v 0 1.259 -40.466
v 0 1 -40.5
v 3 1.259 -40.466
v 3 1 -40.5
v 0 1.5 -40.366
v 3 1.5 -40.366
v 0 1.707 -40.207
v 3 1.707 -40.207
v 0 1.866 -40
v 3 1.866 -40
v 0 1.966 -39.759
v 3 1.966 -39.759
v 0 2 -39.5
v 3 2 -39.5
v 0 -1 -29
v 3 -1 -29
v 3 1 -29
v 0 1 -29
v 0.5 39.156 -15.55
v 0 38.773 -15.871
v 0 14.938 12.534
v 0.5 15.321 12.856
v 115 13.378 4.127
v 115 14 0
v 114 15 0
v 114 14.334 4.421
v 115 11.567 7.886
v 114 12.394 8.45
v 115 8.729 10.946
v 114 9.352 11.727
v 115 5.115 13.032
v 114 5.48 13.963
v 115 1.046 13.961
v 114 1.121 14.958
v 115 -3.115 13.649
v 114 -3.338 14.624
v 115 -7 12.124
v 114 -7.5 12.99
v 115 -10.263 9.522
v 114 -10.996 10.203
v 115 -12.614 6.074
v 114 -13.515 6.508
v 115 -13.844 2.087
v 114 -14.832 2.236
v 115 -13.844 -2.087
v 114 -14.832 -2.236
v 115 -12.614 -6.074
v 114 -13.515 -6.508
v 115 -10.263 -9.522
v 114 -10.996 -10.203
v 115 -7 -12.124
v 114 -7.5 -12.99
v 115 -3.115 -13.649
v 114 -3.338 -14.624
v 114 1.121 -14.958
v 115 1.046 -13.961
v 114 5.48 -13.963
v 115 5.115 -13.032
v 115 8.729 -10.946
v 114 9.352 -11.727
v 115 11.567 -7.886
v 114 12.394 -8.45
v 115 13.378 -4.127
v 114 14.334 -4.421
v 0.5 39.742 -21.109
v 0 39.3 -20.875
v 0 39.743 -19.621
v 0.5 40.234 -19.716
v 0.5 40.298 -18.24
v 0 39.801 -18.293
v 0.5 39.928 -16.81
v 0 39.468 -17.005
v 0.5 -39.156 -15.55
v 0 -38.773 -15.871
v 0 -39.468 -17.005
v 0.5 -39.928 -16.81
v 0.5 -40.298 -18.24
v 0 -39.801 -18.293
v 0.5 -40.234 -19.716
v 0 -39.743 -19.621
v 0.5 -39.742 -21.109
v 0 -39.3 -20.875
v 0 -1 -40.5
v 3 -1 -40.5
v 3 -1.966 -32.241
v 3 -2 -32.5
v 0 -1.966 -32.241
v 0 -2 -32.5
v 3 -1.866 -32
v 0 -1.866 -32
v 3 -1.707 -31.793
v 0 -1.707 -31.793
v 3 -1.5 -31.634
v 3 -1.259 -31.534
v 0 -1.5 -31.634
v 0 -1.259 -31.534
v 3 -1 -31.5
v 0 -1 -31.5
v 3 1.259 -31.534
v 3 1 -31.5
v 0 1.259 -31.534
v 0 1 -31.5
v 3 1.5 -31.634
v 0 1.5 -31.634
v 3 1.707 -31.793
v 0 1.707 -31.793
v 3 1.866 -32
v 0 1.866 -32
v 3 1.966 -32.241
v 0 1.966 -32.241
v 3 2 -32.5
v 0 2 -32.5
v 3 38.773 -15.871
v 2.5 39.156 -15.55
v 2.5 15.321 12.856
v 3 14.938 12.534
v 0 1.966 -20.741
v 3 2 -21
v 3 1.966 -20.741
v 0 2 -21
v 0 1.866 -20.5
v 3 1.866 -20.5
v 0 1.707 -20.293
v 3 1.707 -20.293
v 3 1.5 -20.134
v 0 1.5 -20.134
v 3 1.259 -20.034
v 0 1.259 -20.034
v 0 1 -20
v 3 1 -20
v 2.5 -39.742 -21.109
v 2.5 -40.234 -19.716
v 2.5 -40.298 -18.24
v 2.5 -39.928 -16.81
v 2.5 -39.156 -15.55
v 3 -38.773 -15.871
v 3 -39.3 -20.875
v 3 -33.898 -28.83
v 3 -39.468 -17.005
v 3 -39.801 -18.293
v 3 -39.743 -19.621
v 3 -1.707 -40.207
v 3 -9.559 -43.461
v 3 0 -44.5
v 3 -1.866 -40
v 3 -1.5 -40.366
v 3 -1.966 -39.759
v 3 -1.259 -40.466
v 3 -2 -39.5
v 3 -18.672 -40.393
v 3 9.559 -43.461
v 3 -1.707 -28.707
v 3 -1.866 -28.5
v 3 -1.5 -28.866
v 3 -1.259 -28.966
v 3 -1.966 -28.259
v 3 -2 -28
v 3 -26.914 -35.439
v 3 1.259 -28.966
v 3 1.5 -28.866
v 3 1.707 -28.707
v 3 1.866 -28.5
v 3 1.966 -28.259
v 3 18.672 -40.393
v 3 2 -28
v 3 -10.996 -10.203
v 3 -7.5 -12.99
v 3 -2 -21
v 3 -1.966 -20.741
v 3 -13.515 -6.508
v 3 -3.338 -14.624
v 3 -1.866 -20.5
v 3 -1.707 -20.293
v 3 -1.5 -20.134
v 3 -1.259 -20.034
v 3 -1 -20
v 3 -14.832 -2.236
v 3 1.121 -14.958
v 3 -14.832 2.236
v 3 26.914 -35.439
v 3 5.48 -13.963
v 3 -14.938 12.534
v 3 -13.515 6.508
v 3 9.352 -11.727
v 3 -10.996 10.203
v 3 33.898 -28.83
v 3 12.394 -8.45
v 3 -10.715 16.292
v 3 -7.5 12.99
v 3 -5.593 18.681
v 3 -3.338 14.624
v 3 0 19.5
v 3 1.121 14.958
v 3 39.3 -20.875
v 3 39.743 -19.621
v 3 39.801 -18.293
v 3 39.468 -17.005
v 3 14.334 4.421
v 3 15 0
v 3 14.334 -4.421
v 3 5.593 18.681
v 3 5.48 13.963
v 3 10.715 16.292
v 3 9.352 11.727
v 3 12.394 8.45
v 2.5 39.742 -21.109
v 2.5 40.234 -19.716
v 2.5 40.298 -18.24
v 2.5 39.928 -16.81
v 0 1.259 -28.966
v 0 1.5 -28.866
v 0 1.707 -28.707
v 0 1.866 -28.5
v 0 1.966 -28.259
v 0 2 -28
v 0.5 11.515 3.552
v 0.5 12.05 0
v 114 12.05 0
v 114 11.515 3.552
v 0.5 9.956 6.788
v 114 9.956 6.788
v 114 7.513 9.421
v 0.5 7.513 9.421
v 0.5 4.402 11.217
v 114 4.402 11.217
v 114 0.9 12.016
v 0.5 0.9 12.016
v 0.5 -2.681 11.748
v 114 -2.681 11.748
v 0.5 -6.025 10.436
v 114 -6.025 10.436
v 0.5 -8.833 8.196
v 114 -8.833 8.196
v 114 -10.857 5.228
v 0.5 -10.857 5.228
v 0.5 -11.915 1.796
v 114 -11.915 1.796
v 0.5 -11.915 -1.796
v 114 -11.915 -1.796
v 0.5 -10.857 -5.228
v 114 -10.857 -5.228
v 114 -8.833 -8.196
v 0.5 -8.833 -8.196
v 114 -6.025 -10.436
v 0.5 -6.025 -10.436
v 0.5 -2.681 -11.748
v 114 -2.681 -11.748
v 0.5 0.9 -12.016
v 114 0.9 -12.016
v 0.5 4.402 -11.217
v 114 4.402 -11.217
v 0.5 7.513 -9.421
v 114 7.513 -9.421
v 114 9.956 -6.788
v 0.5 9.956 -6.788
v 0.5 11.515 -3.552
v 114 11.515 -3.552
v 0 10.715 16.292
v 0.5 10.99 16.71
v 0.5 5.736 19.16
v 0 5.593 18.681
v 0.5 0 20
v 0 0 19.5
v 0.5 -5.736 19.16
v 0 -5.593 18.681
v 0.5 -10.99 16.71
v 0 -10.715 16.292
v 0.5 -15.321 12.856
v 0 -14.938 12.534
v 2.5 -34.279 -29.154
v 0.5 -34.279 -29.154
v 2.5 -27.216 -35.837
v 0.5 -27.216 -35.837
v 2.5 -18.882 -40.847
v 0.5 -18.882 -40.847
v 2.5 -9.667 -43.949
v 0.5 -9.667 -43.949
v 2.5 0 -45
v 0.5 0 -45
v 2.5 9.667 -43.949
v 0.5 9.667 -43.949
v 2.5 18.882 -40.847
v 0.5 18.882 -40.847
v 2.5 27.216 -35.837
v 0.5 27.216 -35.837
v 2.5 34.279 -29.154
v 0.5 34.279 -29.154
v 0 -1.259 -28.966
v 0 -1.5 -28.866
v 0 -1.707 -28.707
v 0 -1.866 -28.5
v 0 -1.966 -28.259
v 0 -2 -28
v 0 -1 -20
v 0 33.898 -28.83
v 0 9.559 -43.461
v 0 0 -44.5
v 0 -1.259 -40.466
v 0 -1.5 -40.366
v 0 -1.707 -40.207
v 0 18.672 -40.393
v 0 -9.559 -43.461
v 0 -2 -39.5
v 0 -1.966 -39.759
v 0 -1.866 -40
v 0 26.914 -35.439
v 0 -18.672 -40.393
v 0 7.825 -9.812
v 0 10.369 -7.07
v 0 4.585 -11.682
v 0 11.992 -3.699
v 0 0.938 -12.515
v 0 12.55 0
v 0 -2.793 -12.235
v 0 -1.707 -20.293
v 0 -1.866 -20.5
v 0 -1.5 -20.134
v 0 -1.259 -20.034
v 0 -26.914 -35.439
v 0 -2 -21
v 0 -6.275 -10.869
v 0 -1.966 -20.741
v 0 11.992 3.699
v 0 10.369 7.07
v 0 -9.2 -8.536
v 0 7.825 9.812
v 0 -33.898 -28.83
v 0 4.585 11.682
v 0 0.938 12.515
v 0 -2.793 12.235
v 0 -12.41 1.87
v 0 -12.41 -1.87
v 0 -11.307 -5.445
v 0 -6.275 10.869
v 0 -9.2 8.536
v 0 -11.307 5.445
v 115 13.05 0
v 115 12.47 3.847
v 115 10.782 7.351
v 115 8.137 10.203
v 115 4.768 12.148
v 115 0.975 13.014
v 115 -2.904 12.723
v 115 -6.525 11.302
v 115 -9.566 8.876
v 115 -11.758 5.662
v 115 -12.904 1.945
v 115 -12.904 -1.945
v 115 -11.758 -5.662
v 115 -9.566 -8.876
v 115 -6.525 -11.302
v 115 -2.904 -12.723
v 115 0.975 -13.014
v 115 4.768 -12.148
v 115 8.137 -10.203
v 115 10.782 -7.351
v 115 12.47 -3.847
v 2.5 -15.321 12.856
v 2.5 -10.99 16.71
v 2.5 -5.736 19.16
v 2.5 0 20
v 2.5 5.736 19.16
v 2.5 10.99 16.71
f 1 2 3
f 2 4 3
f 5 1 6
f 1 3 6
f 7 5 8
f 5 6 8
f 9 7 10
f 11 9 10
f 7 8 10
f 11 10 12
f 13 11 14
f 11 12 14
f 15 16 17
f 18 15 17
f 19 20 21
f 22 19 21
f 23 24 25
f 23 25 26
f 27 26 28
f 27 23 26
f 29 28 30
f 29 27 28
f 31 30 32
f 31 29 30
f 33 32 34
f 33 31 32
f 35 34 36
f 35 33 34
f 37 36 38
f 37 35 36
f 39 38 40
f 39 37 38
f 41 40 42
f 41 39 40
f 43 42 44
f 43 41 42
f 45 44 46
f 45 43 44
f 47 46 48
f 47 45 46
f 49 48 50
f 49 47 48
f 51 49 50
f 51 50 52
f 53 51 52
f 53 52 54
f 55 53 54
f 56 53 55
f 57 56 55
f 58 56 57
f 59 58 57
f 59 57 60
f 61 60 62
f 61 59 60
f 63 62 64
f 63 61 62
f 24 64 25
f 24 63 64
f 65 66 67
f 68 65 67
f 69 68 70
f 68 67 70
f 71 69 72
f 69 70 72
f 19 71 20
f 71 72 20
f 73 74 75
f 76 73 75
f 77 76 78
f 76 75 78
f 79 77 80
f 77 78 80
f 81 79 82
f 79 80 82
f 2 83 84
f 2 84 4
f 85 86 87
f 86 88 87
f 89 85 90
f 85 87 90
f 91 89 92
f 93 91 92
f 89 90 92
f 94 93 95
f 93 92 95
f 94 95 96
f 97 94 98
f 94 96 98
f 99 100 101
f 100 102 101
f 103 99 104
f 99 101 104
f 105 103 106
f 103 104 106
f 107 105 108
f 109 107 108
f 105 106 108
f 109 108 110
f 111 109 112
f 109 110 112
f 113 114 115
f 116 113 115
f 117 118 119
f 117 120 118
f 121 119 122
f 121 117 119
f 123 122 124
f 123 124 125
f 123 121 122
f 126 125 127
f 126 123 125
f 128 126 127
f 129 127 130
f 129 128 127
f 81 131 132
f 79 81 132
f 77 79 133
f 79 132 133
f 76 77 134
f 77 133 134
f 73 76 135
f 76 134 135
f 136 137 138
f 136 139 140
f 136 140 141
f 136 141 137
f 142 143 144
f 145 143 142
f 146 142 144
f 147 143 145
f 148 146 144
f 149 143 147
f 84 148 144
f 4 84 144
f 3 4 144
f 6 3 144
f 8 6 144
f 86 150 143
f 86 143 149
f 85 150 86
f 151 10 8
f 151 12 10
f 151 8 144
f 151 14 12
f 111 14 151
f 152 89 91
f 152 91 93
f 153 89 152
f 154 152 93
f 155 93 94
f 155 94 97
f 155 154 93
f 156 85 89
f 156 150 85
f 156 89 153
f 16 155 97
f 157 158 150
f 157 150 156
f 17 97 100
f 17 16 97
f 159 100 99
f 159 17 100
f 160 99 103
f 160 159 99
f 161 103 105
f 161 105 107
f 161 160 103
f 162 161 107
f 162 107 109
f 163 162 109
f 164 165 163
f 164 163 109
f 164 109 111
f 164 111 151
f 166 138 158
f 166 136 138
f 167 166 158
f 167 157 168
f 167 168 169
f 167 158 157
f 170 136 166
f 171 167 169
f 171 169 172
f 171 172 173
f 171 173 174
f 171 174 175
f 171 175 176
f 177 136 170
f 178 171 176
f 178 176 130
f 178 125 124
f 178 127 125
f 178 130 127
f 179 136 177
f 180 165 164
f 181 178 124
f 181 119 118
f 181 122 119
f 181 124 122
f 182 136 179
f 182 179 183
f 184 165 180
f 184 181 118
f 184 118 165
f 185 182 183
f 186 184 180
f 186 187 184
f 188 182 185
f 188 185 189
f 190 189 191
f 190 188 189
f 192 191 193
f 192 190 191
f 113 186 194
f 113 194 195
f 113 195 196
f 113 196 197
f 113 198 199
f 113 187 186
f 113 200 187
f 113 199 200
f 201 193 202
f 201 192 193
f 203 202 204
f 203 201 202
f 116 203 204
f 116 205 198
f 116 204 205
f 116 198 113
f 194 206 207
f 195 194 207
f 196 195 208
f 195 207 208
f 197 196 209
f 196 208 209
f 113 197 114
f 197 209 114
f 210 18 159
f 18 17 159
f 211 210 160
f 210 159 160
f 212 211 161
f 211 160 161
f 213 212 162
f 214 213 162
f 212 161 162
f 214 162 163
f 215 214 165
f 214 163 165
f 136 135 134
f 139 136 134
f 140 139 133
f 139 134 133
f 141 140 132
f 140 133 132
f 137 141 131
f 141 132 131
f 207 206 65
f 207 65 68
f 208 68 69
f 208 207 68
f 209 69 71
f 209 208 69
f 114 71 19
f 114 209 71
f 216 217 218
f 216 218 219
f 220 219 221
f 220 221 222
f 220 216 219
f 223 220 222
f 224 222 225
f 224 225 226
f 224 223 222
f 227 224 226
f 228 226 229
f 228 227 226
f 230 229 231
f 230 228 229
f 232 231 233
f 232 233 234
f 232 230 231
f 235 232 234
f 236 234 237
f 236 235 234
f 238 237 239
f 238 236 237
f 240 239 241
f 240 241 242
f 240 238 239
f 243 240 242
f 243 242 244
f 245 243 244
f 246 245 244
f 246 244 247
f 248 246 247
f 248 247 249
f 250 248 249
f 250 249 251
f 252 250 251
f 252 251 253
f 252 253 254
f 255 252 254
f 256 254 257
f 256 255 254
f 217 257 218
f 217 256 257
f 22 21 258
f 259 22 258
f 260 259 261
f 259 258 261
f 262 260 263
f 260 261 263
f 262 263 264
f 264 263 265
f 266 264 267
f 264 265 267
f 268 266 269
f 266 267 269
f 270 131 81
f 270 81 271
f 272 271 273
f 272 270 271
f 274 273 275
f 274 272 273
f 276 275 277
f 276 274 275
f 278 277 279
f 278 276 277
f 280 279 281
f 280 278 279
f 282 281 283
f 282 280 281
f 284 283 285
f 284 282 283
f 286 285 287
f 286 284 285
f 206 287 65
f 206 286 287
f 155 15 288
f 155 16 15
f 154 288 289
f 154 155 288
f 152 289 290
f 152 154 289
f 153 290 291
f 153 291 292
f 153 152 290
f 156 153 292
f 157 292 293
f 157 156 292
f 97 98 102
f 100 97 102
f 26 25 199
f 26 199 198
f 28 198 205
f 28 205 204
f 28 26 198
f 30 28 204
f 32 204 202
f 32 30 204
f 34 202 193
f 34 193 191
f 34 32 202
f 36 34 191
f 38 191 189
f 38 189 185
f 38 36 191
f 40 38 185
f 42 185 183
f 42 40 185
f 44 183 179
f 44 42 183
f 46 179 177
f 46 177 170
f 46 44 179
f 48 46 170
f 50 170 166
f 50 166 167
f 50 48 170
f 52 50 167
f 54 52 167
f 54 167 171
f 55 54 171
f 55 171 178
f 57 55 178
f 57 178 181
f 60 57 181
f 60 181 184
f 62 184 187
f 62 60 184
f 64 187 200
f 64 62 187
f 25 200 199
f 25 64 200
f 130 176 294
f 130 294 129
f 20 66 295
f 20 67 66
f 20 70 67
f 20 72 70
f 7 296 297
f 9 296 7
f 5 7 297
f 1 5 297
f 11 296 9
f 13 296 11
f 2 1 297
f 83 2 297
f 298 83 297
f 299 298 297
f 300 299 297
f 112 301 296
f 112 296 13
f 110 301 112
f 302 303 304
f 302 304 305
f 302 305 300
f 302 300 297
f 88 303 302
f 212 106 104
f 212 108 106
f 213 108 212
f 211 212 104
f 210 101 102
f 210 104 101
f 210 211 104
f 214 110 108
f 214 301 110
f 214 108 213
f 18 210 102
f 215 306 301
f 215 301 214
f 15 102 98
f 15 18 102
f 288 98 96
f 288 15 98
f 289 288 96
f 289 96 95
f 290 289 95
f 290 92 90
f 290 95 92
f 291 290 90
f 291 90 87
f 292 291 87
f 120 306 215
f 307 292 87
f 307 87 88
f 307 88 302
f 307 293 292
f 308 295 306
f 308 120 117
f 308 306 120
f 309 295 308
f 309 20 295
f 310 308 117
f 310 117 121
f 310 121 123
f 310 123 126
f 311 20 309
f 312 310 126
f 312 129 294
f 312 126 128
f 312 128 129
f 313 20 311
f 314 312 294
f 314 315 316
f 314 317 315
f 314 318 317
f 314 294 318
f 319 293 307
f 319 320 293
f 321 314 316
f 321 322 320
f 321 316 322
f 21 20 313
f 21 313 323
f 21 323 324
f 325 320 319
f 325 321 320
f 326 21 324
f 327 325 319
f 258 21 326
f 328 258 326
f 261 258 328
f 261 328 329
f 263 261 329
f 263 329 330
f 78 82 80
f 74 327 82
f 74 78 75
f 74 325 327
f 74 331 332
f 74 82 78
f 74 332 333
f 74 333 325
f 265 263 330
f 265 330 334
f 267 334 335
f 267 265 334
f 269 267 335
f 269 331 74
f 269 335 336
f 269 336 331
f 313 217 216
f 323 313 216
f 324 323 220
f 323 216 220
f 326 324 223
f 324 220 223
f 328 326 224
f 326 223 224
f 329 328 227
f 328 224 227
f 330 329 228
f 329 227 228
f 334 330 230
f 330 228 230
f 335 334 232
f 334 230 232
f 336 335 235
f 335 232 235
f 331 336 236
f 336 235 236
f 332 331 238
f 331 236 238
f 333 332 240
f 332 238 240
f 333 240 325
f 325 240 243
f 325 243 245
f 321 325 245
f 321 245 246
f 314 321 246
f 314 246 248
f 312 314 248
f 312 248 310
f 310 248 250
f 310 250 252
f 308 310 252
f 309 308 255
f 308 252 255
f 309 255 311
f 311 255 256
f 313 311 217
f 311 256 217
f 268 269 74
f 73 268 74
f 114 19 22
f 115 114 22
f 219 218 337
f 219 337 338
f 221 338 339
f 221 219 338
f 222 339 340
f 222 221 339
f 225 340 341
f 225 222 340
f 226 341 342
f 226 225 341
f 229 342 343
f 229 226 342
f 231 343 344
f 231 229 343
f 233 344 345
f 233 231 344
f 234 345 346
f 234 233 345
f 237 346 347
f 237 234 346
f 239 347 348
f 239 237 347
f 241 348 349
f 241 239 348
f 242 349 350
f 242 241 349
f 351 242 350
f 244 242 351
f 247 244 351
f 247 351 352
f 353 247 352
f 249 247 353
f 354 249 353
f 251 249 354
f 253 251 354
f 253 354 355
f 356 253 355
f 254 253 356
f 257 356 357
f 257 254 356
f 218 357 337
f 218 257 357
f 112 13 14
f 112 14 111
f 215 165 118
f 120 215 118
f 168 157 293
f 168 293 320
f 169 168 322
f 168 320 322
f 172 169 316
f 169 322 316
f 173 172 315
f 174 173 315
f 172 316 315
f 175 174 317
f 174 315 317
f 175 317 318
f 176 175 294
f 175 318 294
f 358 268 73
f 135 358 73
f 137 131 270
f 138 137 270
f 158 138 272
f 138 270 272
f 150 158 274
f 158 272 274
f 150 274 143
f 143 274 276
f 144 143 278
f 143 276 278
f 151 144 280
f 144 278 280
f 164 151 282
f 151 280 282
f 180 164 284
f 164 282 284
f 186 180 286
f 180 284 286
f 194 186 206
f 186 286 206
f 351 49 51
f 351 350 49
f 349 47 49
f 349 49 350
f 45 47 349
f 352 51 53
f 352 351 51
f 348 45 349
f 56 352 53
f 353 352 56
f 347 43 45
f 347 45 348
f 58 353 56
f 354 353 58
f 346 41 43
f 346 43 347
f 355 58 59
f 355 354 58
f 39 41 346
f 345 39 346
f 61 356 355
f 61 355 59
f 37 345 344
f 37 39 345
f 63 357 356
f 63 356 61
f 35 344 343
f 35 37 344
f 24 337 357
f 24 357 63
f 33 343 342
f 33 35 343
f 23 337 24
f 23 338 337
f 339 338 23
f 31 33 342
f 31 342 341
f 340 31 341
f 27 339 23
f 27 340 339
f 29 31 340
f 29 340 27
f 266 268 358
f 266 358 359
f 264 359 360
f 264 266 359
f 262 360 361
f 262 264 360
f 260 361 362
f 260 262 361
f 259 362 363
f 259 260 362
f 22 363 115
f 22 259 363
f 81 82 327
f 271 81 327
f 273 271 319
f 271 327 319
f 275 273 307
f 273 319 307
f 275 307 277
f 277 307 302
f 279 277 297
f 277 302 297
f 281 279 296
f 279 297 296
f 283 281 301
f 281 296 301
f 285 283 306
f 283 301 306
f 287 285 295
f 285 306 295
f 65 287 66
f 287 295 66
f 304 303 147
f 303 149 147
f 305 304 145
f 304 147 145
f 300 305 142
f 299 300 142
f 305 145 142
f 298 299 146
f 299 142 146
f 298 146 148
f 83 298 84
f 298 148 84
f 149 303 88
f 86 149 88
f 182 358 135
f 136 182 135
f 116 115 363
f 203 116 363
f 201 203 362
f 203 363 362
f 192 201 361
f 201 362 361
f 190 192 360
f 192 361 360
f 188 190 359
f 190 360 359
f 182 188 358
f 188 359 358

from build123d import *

# Parameters (mm, degrees)
SKETCH001_W     = 4
SKETCH001_H     = 9
POCKET_DEPTH    = 3
POCKET001_DEPTH = 5
FILLET_R        = 5
FILLET001_R     = 1
CHAMFER_SIZE    = 0.5
CHAMFER001_SIZE = 1


with BuildPart() as part:
    # Sketch → Revolution (revolve)
    with BuildSketch(Plane.XY):
        Polygon((0, 45), (3, 45), (3, 15), (115, 15), (115, 12.05), (0, 12.05), align=None)
    revolve(axis=Axis((0, 0, 0), (1, 0, 0)))

    # Sketch001 → Pocket (cut, symmetric)
    with BuildSketch(Plane.YZ.offset(2)):
        with Locations((0, -36)):
            Rectangle(SKETCH001_W, SKETCH001_H)
        with Locations((0, -24.5)):
            Rectangle(SKETCH001_W, SKETCH001_H)
    extrude(amount=POCKET_DEPTH, both=True, mode=Mode.SUBTRACT)

    # Sketch002 → Pocket001 (cut)
    with BuildSketch(Plane(origin=(0, 0, 0), x_dir=(0, -1, 0), z_dir=(-1, 0, 0))):
        with BuildLine():
            ThreePointArc((44.777118, -22.248814), (0, 50), (-44.777118, -22.248814))
            Line((-44.777118, -22.248814), (-15.320889, 12.855752))
            ThreePointArc((15.320889, 12.855752), (0, 20), (-15.320889, 12.855752))
            Line((15.320889, 12.855752), (44.777118, -22.248814))
        make_face()
    extrude(amount=-POCKET001_DEPTH, mode=Mode.SUBTRACT)

    # Fillet
    fillet_edges = [part.edges().sort_by_distance(p)[0] for p in [
        (1.5, 41.232486, -18.024487),
        (1.5, -41.232486, -18.024487),
    ]]
    fillet(fillet_edges, radius=FILLET_R)

    # Fillet001
    fillet001_edges = [part.edges().sort_by_distance(p)[0] for p in [
        (1.5, 2, -20),
        (1.5, -2, -20),
        (1.5, -2, -29),
        (1.5, 2, -29),
        (1.5, 2, -31.5),
        (1.5, -2, -31.5),
        (1.5, -2, -40.5),
        (1.5, 2, -40.5),
    ]]
    fillet(fillet001_edges, radius=FILLET001_R)

    # Chamfer
    chamfer_edges = [part.edges().sort_by_distance(p)[0] for p in [
        (0, 0, -45),
        (3, 0, -45),
        (0, -12.05, 0),
    ]]
    chamfer(chamfer_edges, length=CHAMFER_SIZE)

    # Chamfer001
    chamfer001_edges = [part.edges().sort_by_distance(p)[0] for p in [
        (115, -15, 0),
        (115, -12.05, 0),
    ]]
    chamfer(chamfer001_edges, length=CHAMFER001_SIZE)


solid = part.part
